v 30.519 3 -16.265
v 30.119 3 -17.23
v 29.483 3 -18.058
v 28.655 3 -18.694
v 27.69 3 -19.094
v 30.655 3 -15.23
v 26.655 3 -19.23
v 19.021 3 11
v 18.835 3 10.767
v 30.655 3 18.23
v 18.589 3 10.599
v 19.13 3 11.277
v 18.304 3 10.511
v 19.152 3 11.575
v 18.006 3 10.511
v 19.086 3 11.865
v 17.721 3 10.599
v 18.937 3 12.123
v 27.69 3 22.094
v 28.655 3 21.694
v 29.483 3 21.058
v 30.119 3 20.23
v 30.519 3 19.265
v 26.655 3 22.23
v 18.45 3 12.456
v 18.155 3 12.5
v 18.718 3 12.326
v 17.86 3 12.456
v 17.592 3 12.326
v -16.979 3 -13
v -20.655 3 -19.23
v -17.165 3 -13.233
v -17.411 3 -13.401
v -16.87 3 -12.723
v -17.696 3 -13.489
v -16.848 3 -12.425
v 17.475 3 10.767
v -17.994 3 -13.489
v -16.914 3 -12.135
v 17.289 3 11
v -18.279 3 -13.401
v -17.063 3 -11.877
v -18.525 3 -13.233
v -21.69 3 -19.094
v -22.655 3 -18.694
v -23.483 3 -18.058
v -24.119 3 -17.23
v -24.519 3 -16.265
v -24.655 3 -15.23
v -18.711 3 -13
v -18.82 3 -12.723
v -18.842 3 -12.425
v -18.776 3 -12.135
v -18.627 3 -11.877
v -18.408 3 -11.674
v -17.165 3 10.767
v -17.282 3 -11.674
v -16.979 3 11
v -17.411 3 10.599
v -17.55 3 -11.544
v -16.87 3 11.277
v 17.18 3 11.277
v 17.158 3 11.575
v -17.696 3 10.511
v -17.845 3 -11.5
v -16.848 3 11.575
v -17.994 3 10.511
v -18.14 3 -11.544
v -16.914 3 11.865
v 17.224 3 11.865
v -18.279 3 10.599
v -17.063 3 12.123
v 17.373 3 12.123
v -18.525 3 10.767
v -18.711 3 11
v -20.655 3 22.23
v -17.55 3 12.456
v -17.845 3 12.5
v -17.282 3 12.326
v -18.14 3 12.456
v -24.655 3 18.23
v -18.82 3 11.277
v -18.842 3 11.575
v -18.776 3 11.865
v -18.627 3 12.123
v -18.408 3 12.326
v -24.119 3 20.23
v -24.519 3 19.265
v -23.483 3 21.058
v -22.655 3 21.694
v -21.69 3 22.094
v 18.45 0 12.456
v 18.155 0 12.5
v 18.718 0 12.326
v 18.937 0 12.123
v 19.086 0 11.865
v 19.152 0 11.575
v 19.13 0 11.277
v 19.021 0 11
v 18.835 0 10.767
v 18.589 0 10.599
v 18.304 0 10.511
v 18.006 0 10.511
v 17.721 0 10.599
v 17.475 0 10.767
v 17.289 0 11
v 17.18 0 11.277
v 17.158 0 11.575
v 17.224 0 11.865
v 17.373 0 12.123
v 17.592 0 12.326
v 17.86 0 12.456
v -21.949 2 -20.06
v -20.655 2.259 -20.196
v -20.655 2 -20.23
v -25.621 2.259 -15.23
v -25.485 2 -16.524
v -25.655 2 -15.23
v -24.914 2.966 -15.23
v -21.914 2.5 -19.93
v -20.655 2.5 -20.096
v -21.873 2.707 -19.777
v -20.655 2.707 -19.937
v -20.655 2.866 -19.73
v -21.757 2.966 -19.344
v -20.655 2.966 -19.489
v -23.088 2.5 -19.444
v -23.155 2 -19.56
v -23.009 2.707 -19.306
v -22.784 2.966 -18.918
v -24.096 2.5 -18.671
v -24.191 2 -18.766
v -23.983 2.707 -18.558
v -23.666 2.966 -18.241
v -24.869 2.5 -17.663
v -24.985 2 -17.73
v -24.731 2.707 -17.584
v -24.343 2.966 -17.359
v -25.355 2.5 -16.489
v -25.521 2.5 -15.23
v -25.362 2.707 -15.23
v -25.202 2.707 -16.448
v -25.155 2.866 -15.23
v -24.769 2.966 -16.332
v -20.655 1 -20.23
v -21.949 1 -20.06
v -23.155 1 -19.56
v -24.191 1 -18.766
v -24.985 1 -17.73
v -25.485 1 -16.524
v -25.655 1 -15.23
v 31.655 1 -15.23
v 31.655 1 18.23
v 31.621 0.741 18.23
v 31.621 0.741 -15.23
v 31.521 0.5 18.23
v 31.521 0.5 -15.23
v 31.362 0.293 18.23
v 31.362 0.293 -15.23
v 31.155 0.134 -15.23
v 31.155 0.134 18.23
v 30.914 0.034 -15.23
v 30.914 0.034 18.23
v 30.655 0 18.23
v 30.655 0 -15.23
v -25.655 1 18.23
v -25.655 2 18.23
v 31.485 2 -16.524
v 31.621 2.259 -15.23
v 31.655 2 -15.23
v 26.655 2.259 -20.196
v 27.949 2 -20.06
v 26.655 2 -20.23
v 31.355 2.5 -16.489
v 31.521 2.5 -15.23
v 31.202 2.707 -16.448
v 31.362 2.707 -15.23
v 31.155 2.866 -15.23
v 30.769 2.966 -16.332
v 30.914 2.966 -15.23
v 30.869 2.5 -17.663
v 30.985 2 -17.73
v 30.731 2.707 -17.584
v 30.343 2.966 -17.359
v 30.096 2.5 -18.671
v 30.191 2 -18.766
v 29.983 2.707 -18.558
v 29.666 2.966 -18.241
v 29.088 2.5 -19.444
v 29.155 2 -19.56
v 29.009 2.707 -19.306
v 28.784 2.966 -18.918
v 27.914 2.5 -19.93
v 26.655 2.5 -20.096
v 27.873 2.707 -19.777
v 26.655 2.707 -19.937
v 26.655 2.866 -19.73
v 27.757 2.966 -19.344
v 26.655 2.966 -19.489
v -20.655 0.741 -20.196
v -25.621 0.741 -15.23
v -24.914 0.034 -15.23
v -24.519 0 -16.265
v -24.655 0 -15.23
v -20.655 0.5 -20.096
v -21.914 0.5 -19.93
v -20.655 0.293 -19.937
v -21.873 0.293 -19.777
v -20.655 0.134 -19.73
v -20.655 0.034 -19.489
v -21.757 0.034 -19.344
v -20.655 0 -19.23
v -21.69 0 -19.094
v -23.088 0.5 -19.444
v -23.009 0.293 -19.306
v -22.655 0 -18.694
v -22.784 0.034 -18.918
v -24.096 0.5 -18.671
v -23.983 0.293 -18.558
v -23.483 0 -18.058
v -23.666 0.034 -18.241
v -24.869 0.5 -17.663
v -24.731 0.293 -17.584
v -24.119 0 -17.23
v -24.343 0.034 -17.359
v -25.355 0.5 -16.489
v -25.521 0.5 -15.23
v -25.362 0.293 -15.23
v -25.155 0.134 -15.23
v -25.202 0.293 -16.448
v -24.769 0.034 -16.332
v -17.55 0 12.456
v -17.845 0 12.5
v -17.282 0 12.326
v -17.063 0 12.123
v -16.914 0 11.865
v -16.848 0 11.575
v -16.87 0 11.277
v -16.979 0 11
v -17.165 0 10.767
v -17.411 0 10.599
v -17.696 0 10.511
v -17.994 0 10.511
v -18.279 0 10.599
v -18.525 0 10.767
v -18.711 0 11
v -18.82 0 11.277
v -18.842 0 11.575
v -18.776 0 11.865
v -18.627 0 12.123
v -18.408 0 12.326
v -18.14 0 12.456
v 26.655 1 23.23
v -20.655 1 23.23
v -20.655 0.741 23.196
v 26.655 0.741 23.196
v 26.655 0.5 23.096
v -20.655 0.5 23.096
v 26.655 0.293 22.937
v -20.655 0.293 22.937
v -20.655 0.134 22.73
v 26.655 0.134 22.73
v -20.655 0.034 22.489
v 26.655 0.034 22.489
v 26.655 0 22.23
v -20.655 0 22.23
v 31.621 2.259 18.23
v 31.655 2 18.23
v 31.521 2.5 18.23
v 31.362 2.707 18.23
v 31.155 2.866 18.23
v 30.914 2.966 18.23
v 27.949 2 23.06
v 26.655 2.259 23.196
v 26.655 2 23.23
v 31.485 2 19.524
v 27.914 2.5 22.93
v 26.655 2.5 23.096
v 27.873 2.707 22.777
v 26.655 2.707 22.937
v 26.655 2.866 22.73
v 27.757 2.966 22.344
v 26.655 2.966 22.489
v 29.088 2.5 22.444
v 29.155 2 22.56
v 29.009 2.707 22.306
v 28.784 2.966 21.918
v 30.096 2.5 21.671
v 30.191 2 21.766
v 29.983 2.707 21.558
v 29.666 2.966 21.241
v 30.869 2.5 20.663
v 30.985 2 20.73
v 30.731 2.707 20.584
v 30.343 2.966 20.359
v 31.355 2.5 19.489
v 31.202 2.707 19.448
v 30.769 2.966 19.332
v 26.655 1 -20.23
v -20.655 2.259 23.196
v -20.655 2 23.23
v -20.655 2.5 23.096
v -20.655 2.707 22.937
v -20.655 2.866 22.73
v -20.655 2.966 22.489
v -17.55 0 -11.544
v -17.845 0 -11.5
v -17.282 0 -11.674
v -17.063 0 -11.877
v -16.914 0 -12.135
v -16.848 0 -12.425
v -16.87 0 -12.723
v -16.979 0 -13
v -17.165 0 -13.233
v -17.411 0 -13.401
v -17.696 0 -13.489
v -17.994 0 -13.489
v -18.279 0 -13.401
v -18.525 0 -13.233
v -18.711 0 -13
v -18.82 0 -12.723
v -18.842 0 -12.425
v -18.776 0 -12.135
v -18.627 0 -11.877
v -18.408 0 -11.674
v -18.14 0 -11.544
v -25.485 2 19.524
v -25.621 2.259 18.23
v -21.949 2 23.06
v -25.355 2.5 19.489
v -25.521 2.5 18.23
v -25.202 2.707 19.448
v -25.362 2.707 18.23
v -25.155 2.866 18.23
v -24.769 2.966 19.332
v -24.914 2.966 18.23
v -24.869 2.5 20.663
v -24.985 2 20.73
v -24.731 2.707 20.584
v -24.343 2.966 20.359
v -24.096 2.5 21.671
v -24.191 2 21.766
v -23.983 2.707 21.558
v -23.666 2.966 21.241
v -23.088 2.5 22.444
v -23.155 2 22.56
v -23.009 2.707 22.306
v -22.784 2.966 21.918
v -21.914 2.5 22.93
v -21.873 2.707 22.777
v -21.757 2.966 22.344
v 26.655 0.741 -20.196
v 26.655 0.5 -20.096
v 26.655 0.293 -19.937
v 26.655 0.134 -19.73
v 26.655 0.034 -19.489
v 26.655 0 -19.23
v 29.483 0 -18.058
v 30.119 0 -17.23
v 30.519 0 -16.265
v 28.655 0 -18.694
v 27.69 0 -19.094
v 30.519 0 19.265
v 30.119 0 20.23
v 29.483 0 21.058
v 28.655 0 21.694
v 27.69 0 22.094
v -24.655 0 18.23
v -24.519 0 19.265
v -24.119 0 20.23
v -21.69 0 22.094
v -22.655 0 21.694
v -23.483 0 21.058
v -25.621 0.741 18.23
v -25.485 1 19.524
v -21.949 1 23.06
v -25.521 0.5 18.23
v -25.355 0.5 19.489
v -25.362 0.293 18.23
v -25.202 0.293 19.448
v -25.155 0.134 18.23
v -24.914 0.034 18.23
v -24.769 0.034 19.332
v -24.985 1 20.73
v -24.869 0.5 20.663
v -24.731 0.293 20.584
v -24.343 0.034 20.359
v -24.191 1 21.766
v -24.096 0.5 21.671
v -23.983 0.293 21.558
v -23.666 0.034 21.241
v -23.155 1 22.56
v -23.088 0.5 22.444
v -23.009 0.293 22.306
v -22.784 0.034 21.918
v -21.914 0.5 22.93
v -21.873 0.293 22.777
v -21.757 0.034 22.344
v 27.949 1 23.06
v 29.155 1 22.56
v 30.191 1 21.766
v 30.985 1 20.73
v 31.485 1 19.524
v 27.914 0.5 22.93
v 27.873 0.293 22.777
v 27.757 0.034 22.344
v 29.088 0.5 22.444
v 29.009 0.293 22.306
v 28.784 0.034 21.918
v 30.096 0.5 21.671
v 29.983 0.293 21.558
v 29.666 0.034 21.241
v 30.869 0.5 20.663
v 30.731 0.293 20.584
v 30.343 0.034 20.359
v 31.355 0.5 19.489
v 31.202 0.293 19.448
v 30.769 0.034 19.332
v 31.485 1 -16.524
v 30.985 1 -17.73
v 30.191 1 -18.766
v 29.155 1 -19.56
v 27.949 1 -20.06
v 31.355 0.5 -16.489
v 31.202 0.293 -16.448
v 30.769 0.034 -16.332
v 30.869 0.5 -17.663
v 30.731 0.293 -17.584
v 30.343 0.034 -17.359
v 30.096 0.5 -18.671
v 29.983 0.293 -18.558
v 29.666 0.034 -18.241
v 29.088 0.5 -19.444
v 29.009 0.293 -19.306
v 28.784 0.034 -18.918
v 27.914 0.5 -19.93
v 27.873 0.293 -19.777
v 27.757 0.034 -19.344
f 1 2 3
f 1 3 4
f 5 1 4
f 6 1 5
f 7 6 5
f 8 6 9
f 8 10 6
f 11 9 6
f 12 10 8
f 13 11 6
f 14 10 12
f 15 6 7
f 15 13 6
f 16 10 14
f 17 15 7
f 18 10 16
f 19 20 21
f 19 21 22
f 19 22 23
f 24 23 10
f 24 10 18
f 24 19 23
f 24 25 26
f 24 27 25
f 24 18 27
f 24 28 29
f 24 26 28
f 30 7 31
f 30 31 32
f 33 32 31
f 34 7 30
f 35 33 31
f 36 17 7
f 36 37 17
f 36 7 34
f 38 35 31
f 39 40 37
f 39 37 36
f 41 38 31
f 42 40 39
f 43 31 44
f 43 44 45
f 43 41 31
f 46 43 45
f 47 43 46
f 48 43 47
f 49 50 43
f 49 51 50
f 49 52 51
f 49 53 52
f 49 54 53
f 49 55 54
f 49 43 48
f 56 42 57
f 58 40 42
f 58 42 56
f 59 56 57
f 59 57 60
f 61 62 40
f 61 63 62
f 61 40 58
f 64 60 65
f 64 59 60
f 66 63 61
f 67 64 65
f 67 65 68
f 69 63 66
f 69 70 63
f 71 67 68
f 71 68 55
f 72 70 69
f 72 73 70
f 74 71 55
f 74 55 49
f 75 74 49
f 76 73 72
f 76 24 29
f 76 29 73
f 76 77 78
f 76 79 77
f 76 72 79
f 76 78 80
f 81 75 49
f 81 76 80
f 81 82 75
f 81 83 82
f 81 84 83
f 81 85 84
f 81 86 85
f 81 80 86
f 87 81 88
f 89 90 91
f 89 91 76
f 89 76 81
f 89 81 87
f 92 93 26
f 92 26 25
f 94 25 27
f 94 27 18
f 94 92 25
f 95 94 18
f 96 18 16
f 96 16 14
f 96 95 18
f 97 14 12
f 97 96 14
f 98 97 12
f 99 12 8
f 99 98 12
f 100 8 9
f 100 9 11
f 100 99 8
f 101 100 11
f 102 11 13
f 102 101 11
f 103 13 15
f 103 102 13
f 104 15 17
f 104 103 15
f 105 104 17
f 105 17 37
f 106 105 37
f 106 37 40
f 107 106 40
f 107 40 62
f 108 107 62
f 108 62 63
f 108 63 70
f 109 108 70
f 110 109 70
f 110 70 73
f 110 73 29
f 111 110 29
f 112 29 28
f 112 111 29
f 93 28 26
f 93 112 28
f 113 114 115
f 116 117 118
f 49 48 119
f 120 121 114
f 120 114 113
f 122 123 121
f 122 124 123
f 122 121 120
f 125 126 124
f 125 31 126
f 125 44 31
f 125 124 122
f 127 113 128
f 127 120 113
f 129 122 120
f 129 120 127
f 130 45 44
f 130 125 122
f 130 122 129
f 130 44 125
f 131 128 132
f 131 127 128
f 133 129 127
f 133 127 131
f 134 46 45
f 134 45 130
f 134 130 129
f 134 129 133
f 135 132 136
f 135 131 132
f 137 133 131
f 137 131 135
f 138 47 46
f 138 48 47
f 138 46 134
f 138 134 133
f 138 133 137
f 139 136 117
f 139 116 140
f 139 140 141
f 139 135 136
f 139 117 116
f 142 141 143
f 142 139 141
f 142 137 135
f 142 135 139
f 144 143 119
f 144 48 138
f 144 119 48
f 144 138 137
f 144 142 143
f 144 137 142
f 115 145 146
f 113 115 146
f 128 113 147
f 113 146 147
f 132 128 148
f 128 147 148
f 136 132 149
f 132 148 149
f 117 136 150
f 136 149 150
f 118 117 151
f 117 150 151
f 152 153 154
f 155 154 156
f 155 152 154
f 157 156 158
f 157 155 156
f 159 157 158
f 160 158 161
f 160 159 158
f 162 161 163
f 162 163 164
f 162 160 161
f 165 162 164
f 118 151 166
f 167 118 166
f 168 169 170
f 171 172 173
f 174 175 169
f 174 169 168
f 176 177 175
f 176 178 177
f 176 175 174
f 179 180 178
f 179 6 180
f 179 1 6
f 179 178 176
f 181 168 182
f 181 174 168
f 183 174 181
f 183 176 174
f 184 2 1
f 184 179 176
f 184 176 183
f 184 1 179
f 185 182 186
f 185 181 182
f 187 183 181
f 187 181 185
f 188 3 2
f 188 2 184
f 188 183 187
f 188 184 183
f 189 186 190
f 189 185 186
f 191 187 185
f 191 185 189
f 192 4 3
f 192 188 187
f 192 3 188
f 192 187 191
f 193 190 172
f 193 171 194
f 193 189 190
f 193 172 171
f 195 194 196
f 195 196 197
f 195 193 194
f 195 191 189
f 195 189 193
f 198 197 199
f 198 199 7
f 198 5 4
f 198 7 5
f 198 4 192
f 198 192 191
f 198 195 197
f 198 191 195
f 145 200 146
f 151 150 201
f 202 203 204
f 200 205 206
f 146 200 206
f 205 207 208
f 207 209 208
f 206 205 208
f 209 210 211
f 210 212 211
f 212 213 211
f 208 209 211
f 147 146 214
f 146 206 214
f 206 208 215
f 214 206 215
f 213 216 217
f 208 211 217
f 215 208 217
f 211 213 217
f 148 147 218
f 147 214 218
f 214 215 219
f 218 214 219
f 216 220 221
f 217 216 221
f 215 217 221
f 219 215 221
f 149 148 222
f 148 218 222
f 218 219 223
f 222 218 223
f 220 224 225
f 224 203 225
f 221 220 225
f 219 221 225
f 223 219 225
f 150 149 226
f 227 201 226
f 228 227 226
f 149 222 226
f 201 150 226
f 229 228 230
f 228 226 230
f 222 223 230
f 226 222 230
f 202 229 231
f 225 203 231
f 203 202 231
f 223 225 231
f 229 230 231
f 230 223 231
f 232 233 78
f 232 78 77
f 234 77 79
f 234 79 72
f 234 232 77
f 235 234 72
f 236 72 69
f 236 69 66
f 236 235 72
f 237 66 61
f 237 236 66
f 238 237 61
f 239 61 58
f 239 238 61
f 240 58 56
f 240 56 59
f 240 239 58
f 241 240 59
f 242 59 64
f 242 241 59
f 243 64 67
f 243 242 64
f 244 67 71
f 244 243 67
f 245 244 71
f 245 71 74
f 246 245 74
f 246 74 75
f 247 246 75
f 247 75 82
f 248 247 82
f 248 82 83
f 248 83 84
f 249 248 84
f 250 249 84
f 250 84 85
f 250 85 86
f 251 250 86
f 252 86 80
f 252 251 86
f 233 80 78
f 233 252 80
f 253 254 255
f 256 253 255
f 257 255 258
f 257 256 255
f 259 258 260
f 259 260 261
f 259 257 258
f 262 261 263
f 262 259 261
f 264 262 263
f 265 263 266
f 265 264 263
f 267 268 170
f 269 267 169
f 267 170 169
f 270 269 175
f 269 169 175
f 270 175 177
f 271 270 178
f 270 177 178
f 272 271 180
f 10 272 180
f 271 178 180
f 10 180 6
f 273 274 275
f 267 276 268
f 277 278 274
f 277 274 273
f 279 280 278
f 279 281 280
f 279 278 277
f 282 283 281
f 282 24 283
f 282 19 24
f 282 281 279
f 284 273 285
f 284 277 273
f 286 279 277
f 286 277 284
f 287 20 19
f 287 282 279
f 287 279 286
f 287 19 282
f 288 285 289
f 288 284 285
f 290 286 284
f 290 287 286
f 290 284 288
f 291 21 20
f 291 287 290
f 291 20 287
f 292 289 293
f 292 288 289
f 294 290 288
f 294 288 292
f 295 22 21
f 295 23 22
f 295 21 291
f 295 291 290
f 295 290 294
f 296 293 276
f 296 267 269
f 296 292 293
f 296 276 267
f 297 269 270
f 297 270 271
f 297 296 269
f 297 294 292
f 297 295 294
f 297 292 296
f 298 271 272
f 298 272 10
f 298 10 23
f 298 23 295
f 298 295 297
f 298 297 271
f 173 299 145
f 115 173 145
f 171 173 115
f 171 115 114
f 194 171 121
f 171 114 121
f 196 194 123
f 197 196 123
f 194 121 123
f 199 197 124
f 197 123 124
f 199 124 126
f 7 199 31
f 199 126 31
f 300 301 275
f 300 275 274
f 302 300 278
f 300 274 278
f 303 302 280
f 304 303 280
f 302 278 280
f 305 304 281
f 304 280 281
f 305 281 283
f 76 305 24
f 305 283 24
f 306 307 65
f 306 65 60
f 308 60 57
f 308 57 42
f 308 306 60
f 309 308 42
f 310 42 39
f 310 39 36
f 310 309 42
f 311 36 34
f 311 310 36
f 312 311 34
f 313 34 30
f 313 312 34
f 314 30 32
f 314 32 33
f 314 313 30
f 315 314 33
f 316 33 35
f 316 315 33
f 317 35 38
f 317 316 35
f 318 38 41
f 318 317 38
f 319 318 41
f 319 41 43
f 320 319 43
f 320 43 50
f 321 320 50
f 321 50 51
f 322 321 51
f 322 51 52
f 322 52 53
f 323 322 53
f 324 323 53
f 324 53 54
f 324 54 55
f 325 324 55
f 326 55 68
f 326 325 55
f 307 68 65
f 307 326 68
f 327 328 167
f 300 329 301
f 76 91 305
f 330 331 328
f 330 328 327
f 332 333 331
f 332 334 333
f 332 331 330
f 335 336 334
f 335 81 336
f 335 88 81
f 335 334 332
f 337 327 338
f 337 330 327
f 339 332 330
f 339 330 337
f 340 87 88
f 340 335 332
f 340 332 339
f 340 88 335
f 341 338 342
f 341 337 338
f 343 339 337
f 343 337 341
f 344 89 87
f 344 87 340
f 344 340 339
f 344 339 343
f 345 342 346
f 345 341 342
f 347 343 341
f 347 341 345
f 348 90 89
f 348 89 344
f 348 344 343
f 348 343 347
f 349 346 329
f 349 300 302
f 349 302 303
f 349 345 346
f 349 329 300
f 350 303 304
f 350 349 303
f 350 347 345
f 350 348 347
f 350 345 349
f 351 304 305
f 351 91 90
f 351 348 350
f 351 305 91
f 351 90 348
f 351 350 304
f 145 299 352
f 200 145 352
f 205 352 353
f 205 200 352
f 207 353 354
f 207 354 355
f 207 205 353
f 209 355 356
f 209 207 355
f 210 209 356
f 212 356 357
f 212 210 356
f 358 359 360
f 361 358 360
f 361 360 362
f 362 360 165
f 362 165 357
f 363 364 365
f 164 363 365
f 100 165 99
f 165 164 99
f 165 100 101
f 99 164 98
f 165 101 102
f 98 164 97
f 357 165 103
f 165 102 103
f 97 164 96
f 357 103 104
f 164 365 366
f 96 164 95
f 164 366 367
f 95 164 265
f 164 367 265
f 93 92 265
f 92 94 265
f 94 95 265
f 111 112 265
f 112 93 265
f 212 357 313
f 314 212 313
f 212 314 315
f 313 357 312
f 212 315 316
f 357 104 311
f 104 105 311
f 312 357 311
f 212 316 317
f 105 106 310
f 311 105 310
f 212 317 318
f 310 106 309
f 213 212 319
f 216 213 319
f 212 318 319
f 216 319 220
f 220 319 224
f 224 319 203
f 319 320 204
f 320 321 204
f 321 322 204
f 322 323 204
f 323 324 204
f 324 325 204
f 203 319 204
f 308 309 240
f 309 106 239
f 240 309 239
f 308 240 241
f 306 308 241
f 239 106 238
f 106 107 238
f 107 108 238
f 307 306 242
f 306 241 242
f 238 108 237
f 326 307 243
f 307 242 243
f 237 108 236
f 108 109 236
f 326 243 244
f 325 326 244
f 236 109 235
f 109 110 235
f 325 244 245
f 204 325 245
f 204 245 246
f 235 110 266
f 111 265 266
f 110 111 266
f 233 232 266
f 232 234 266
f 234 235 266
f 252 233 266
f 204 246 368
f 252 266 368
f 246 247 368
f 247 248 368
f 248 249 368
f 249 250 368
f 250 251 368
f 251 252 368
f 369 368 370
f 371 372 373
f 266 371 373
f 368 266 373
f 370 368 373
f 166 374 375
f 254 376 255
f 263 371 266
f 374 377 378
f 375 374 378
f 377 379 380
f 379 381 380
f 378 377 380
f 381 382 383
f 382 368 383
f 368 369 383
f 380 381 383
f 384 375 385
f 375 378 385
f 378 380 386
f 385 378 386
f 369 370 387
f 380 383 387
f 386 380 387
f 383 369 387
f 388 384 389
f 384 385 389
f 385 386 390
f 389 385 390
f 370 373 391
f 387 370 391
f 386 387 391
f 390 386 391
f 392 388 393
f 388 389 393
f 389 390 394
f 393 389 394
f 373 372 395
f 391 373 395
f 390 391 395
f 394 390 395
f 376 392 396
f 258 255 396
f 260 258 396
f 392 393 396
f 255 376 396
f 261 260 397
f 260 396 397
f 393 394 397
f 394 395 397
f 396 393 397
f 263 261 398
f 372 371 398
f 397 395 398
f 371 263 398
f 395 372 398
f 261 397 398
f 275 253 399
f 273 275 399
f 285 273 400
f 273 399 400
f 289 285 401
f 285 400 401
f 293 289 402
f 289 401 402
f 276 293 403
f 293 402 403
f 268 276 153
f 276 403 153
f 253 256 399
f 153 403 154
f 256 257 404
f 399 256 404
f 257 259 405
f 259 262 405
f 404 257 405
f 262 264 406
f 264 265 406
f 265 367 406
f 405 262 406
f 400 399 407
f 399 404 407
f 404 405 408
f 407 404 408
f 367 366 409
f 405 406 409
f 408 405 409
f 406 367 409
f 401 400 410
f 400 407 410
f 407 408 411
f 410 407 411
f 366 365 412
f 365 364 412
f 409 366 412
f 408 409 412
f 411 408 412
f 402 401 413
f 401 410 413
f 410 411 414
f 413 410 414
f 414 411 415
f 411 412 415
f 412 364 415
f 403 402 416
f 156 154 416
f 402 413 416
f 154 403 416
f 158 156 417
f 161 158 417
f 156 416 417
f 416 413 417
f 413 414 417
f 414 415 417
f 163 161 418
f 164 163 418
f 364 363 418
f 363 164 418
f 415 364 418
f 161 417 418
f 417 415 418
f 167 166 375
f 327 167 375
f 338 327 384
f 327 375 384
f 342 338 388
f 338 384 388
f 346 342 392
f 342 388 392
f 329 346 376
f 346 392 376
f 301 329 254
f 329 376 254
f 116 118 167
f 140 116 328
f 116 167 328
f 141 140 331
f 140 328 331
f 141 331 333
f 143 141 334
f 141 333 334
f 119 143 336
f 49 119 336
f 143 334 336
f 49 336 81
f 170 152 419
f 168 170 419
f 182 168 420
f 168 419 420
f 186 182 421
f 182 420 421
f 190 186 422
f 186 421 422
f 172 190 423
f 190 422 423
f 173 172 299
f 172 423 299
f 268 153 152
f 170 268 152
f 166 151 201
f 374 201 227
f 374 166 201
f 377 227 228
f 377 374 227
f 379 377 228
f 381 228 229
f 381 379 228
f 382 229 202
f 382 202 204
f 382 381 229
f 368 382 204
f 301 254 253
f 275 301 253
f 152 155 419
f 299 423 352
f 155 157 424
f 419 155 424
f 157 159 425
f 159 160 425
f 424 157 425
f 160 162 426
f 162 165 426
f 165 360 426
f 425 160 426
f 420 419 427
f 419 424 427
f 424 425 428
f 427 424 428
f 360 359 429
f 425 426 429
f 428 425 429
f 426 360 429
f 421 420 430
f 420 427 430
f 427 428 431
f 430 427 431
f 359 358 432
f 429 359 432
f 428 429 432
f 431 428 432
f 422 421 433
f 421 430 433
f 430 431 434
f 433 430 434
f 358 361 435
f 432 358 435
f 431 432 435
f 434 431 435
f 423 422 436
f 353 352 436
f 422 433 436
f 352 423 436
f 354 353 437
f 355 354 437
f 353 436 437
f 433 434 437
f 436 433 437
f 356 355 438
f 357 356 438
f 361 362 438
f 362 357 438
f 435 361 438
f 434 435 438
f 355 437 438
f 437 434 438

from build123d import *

# Parameters (mm, degrees)
SKETCH1_R           = 1
BOSS_EXTRUDE1_DEPTH = 3
FILLET1_R           = 1


with BuildPart() as part:
    # Sketch1 → Boss-Extrude1 (new body)
    with BuildSketch(Plane(origin=(0, 0, 0), x_dir=(-1, 0, 0), z_dir=(0, 1, 0))):
        with BuildLine():
            Line((-31.655, 18.23), (-31.655, -15.23))
            ThreePointArc((-31.655, -15.23), (-30.190533906, -18.765533906), (-26.655, -20.23))
            Line((-26.655, -20.23), (20.655, -20.23))
            ThreePointArc((20.655, -20.23), (24.190533906, -18.765533906), (25.655, -15.23))
            Line((25.655, -15.23), (25.655, 18.23))
            ThreePointArc((25.655, 18.23), (24.190533906, 21.765533906), (20.655, 23.23))
            Line((20.655, 23.23), (-26.655, 23.23))
            ThreePointArc((-26.655, 23.23), (-30.190533906, 21.765533906), (-31.655, 18.23))
        make_face()
        with Locations(Location((-18.155, 11.5, 0), (0, 0, 90))):
            Circle(SKETCH1_R, mode=Mode.SUBTRACT)
        with Locations(Location((17.845, 11.5, 0), (0, 0, 90))):
            Circle(SKETCH1_R, mode=Mode.SUBTRACT)
        with Locations(Location((17.845, -12.5, 0), (0, 0, 90))):
            Circle(SKETCH1_R, mode=Mode.SUBTRACT)
    extrude(amount=BOSS_EXTRUDE1_DEPTH)

    # Fillet1
    fillet1_edges = [part.edges().sort_by_distance(p)[0] for p in [
        (30.190533906, 3, -18.765533906),
        (31.655, 0, 1.5),
        (30.190533906, 0, 21.765533906),
        (3, 3, -20.23),
        (-24.190533906, 3, -18.765533906),
        (-25.655, 3, 1.5),
        (-24.190533906, 3, 21.765533906),
        (3, 3, 23.23),
        (30.190533906, 3, 21.765533906),
        (31.655, 3, 1.5),
        (3, 0, 23.23),
        (-24.190533906, 0, 21.765533906),
        (-25.655, 0, 1.5),
        (-24.190533906, 0, -18.765533906),
        (3, 0, -20.23),
        (30.190533906, 0, -18.765533906),
    ]]
    fillet(fillet1_edges, radius=FILLET1_R)


solid = part.part
